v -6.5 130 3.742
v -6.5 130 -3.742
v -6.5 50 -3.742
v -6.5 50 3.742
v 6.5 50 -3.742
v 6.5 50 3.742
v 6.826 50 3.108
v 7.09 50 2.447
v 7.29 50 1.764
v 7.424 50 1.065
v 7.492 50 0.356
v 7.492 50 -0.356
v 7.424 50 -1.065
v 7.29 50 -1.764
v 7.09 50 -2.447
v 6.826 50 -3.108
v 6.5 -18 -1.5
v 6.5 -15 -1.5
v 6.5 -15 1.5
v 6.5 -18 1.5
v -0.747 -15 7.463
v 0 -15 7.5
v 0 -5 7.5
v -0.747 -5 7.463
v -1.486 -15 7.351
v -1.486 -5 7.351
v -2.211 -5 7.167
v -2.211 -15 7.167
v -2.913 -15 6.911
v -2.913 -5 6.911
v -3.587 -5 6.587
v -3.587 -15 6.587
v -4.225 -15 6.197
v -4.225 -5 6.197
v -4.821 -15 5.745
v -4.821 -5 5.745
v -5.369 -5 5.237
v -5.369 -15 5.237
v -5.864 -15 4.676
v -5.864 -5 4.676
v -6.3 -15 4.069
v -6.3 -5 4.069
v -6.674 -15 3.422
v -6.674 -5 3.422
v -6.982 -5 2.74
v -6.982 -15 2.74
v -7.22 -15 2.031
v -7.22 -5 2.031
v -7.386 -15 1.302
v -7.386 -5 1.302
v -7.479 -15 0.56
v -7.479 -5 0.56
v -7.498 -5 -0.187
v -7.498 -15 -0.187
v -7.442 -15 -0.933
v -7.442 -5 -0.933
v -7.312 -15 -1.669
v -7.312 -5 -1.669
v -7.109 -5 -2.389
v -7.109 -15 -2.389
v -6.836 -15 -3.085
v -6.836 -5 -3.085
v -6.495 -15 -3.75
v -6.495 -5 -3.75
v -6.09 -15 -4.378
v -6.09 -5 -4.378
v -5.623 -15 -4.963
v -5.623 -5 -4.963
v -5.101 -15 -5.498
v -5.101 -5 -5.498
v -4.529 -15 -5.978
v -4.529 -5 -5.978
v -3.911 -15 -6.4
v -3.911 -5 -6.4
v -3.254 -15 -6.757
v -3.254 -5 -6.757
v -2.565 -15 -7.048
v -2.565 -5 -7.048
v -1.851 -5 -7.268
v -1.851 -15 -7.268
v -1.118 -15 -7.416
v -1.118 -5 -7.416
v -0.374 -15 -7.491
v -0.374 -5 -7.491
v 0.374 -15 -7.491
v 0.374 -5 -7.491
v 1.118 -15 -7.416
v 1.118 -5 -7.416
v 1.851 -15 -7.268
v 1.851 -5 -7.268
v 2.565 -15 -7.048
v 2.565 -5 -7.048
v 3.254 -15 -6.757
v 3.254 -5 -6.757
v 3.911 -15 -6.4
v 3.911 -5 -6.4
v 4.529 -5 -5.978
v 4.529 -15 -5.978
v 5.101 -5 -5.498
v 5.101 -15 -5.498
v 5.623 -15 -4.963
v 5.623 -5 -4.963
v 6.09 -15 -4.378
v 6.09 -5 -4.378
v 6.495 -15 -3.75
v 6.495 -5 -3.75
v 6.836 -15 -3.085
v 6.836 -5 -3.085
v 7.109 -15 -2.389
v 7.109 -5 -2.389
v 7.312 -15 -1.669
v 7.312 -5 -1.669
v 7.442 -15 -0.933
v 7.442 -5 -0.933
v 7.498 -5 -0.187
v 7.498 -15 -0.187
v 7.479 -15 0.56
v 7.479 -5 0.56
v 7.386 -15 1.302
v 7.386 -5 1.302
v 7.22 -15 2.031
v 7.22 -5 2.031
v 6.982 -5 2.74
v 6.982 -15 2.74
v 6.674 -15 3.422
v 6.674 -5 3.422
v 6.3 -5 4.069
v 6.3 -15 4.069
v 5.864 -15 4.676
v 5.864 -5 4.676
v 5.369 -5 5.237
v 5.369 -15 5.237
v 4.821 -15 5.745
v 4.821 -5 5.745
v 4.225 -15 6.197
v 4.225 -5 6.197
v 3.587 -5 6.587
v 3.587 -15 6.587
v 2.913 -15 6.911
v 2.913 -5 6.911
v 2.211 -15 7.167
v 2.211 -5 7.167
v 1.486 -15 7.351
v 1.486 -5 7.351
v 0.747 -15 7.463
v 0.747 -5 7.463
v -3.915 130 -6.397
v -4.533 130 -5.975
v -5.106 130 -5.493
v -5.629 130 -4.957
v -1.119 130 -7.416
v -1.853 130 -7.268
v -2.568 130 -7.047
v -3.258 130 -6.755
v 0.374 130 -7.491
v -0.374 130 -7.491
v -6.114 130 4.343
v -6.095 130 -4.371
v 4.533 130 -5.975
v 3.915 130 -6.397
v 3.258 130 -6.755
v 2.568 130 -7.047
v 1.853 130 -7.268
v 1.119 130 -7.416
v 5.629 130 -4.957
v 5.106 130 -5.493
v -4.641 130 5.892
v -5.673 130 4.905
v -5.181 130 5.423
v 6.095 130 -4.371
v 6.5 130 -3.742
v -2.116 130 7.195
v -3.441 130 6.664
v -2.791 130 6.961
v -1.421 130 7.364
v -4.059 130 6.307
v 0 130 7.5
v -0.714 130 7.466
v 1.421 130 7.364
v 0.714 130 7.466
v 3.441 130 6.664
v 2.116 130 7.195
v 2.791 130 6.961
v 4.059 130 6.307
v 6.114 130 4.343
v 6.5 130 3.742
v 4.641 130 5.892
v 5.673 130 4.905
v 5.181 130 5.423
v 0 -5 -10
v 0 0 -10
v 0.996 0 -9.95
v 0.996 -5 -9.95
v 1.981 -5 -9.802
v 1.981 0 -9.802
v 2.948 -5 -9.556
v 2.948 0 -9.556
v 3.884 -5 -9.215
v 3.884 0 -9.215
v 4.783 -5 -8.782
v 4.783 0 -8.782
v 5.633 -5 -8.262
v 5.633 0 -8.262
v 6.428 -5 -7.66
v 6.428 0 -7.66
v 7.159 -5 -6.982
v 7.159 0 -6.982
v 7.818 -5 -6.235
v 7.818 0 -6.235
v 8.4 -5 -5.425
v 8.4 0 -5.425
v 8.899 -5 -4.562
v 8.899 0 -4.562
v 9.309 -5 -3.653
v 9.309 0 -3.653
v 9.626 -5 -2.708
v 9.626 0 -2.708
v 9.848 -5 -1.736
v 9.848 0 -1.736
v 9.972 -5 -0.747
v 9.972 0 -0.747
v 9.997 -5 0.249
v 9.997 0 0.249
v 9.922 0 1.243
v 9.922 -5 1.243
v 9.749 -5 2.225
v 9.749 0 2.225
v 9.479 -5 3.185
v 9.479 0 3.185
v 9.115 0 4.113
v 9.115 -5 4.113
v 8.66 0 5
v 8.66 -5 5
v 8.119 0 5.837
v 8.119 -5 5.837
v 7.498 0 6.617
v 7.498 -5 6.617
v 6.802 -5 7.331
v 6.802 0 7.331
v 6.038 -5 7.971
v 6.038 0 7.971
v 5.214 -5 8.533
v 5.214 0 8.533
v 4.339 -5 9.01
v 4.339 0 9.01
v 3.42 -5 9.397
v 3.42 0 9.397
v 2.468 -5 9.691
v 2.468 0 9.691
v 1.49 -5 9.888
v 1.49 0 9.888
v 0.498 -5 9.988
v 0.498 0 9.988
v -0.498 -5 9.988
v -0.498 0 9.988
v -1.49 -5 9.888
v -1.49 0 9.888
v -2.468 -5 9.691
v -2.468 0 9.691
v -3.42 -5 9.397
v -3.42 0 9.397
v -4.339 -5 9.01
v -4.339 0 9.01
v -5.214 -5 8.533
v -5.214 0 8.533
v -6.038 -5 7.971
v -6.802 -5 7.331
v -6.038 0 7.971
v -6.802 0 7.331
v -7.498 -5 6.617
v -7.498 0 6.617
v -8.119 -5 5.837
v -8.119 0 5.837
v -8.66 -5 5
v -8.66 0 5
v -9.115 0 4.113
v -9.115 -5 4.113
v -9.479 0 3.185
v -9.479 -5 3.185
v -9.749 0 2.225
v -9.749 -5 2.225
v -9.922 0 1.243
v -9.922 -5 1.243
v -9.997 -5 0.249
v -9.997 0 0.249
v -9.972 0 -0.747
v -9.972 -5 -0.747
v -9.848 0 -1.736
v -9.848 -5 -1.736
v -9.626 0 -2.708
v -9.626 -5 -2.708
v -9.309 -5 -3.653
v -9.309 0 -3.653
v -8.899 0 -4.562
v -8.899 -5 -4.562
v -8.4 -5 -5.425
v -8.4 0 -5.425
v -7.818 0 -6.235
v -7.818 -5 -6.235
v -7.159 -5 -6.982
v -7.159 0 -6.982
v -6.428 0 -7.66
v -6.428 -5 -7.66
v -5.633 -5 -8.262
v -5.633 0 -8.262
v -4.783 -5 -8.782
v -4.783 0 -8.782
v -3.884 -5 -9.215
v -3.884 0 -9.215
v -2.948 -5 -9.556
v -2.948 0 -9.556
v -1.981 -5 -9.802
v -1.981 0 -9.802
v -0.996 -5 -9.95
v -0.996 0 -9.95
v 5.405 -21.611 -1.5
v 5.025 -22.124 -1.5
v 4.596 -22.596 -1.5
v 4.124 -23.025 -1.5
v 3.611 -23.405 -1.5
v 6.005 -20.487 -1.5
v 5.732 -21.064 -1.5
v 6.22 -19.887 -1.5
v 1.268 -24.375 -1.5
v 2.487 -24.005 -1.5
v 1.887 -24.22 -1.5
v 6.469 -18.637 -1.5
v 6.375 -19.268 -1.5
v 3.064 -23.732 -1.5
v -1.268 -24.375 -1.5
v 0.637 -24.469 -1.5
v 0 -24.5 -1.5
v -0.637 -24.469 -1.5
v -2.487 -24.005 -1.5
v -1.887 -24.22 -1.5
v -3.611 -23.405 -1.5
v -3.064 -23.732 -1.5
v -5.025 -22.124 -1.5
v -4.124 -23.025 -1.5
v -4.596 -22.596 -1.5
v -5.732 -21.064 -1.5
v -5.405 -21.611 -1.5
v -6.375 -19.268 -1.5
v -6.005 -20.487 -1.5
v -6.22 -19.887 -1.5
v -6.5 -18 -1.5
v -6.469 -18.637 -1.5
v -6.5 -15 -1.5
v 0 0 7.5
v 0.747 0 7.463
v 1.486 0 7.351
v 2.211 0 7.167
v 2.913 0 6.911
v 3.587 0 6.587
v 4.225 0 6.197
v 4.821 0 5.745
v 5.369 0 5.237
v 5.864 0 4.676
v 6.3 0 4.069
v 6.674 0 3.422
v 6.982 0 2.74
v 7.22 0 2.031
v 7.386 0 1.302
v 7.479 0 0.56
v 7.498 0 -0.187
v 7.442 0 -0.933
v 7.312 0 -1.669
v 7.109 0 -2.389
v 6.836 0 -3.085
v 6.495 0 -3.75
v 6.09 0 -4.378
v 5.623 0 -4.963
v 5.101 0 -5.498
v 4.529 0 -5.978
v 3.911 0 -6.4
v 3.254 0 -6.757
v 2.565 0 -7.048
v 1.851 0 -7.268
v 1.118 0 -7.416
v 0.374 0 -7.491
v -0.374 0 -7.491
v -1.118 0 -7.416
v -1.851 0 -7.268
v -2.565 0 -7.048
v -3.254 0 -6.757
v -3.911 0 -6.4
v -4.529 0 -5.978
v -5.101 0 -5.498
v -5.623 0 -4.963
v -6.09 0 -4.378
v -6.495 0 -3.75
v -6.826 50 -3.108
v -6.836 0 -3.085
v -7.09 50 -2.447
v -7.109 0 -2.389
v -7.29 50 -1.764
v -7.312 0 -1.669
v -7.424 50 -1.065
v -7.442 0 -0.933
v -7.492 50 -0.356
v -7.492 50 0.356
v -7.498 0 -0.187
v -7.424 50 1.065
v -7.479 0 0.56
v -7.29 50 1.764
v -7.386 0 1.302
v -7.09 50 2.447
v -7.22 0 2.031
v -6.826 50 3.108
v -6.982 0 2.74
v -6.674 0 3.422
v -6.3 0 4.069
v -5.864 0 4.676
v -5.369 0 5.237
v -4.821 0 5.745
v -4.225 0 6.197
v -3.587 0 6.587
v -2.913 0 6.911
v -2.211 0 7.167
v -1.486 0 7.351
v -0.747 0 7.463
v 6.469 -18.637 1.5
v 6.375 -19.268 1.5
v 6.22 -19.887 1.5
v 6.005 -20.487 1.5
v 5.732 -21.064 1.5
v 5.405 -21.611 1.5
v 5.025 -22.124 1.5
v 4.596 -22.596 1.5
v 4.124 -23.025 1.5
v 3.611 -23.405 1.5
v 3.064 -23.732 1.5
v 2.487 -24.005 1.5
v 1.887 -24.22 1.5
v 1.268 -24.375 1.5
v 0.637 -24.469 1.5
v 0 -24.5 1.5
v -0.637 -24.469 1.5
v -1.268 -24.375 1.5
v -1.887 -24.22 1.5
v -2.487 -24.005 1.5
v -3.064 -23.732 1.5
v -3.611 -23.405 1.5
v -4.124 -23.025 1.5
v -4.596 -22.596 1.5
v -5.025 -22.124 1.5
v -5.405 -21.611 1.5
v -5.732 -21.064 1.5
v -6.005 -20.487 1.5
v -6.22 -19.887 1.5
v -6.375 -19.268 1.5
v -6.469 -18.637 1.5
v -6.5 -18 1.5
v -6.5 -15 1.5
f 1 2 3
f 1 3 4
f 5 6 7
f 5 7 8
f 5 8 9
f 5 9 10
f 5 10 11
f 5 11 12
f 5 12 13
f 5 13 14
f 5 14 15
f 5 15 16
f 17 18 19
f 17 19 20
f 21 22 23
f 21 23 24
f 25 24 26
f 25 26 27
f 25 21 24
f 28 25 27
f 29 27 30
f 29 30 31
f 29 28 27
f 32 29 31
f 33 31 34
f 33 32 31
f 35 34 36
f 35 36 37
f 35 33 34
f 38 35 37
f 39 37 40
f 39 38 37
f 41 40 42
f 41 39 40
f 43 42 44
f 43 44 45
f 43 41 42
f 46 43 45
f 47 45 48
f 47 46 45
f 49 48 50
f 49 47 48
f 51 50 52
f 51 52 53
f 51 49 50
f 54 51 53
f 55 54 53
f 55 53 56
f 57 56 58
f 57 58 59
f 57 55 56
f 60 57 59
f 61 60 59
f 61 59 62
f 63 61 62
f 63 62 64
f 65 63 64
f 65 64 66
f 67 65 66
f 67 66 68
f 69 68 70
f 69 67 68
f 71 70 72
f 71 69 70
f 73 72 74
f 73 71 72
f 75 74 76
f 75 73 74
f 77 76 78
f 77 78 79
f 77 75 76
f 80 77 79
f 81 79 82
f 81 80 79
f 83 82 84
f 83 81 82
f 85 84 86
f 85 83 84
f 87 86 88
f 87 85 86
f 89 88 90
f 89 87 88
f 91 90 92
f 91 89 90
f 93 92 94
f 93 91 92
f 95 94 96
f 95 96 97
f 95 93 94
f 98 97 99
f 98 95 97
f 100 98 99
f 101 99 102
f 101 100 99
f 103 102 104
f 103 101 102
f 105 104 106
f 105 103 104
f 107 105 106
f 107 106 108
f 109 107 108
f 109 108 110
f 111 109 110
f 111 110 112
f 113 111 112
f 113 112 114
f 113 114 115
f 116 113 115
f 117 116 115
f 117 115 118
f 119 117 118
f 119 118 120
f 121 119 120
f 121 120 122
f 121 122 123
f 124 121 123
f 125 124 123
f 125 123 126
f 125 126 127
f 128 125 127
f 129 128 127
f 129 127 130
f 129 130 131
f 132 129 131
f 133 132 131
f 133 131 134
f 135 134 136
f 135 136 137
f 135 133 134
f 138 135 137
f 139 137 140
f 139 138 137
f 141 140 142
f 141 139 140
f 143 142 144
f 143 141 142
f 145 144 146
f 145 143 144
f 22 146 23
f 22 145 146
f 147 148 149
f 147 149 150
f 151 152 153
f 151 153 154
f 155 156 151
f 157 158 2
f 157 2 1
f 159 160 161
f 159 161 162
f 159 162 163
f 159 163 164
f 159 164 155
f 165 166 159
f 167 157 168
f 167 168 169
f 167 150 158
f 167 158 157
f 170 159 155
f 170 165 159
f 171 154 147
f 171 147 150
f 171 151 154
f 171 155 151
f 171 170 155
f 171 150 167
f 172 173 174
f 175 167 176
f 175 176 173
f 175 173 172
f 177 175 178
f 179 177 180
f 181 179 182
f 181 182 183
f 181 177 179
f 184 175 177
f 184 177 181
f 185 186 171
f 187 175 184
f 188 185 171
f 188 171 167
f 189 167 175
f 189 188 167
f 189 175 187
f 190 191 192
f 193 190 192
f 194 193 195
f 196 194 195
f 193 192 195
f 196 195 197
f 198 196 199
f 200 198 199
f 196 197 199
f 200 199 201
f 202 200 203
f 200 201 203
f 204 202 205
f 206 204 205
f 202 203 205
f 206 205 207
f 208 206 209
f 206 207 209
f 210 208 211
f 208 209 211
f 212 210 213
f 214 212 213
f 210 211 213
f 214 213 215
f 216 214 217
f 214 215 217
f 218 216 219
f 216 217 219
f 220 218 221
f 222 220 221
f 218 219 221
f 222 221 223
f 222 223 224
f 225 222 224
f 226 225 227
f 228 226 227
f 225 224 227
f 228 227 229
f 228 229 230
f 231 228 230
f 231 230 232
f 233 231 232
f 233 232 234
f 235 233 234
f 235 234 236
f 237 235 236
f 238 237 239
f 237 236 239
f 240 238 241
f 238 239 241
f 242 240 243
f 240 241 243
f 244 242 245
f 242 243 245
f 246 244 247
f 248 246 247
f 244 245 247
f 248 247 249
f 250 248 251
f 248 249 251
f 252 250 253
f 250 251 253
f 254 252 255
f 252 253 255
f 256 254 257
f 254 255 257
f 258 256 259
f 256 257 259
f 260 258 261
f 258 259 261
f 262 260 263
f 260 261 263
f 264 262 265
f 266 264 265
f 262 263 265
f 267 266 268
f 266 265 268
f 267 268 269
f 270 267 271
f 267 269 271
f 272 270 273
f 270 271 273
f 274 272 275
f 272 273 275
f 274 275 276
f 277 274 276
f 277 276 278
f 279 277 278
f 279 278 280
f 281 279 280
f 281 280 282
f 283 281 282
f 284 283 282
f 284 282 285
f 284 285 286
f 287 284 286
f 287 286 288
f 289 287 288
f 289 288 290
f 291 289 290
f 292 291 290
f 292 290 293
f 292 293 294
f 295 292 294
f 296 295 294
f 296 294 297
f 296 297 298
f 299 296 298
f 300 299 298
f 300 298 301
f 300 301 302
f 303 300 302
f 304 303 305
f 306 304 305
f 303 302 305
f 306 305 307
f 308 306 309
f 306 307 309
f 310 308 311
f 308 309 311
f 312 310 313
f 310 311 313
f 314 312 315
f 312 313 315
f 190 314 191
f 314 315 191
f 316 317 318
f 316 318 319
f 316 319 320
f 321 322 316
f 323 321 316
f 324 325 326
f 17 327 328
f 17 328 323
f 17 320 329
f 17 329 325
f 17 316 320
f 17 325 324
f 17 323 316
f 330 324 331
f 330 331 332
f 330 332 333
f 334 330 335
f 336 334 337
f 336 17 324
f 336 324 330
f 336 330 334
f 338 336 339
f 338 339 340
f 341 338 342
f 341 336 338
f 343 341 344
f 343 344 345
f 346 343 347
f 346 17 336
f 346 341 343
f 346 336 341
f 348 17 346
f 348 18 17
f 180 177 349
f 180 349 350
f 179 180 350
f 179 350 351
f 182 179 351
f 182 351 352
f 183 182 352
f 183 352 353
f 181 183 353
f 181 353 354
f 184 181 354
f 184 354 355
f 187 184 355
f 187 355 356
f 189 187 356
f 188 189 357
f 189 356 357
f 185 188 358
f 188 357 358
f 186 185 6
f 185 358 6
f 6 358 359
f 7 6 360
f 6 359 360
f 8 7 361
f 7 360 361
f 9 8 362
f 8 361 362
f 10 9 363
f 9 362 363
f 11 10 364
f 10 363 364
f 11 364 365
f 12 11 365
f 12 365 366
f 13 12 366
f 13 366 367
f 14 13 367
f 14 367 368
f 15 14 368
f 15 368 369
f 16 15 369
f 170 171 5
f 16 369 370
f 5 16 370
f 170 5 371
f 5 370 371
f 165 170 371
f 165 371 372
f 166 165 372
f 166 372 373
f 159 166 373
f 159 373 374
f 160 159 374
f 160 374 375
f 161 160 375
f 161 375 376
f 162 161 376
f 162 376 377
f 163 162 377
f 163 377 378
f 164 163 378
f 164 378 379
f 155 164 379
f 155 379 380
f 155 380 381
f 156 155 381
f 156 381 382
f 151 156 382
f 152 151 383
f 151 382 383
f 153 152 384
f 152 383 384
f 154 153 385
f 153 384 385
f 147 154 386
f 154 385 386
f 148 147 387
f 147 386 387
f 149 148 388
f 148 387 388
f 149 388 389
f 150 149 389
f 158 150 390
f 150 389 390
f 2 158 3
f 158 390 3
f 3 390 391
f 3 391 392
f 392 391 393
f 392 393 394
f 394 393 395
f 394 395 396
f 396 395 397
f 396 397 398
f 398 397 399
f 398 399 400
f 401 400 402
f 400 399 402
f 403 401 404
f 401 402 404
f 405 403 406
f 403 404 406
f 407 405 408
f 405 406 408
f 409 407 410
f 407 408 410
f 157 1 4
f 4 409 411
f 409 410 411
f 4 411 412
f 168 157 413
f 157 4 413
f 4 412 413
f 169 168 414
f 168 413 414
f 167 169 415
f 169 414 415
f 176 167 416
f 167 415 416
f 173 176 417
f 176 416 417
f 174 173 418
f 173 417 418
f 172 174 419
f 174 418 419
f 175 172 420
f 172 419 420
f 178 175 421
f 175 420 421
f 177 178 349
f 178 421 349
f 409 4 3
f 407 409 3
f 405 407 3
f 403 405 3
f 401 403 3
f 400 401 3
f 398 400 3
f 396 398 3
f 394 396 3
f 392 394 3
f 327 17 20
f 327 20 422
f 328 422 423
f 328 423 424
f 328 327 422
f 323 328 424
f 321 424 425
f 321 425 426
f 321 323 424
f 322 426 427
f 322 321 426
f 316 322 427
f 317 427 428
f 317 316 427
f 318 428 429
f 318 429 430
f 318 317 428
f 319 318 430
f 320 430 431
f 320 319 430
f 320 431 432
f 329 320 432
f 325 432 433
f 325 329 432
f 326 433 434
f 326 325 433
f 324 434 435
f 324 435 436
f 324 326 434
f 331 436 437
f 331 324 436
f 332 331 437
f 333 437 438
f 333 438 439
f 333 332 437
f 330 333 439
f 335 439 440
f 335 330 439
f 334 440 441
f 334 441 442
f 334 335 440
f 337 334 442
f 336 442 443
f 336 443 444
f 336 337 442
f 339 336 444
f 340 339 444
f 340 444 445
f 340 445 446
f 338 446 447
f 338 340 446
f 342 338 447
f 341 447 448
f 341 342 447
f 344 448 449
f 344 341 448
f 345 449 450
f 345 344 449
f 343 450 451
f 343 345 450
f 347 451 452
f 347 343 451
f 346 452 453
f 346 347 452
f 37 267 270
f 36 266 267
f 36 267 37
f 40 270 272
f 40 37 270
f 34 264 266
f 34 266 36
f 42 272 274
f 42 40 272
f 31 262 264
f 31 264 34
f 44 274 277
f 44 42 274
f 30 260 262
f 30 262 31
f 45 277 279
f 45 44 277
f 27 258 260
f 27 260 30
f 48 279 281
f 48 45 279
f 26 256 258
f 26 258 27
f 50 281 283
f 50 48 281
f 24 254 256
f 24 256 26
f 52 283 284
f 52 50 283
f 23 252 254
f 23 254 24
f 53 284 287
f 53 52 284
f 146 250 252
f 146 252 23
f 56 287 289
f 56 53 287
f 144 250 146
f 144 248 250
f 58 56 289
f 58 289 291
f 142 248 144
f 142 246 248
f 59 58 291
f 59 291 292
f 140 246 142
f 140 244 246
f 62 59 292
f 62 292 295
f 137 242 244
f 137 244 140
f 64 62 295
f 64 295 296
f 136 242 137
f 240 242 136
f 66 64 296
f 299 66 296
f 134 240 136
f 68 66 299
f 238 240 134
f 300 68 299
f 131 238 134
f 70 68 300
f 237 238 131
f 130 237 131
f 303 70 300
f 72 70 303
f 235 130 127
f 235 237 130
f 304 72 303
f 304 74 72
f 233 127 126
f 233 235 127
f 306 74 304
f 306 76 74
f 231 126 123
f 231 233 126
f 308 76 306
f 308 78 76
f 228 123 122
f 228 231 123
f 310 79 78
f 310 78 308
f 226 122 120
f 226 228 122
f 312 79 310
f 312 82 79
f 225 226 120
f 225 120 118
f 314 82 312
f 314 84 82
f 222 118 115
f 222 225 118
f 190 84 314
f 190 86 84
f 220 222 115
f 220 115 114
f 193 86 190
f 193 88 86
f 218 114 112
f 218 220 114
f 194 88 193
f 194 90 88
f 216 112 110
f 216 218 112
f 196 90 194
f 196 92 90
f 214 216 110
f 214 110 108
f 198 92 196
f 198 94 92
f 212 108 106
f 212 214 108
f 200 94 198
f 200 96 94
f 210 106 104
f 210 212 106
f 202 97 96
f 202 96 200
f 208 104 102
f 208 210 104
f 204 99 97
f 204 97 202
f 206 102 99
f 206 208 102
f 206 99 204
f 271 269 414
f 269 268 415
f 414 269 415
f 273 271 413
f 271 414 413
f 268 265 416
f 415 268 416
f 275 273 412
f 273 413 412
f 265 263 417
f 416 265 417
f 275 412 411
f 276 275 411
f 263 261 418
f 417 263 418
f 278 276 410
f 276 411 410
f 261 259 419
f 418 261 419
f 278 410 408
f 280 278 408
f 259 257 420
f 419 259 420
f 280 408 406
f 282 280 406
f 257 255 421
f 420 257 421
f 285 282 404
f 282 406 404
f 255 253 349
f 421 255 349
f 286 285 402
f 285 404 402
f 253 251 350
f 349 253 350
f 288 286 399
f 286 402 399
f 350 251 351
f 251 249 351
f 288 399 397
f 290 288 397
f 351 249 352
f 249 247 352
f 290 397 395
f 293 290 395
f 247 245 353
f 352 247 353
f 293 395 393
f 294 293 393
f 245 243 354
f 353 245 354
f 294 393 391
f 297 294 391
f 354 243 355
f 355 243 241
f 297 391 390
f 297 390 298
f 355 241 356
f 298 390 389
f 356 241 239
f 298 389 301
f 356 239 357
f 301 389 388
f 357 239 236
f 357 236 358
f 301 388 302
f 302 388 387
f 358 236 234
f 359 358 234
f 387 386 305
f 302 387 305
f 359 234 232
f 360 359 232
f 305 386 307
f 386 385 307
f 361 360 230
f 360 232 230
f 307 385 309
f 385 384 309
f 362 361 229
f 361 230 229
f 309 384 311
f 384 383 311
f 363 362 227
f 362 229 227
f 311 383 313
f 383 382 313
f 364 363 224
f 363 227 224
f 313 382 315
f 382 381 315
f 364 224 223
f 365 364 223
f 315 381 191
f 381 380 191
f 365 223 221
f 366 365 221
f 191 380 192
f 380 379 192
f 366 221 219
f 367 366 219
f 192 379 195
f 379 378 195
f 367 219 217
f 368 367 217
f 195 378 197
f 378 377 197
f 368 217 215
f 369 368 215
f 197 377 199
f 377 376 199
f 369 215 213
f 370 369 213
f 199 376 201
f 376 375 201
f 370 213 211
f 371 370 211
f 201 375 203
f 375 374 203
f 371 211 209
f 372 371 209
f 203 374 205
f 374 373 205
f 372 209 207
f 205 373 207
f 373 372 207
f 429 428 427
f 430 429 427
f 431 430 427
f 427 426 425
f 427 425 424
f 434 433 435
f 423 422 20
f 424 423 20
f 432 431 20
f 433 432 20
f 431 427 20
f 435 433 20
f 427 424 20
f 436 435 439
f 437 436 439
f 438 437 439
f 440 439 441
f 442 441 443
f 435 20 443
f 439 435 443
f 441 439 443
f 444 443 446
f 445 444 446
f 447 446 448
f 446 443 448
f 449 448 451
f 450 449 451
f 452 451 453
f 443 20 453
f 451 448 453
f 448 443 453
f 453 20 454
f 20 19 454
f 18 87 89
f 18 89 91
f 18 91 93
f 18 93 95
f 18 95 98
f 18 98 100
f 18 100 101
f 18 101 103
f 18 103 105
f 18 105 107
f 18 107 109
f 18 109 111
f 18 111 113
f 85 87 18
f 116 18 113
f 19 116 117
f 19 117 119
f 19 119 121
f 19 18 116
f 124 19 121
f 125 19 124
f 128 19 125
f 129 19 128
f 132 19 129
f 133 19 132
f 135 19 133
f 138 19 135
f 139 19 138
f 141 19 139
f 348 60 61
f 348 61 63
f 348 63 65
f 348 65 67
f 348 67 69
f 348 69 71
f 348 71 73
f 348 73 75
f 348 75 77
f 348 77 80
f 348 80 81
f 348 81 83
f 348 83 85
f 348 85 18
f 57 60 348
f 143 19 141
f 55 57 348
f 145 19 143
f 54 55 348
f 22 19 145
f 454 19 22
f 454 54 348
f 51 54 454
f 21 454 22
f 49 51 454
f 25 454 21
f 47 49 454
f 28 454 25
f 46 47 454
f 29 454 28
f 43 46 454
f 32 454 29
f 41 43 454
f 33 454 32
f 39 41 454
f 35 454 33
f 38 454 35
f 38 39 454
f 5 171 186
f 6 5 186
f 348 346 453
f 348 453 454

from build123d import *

# Parameters (mm, degrees)
SKETCH3_R                = 7.5
BOSS_EXTRUDE1_DEPTH      = 130
SKETCH4_R                = 10
BOSS_EXTRUDE2_DEPTH      = 5
BOSS_EXTRUDE3_START      = 10
SKETCH5_R                = 7.5
BOSS_EXTRUDE3_DEPTH      = 10
BOSS_EXTRUDE4_DEPTH      = 1.5
BOSS_EXTRUDE4_DEPTH_BACK = 1.5
CUT_EXTRUDE1_START       = -80
CUT_EXTRUDE1_DEPTH       = 80


with BuildPart() as part:
    # Sketch3 → Boss-Extrude1 (new body)
    with BuildSketch(Plane(origin=(0, 0, 0), x_dir=(1, 0, 0), z_dir=(0, 1, 0))):
        Circle(SKETCH3_R)
    extrude(amount=BOSS_EXTRUDE1_DEPTH)

    # Sketch4 → Boss-Extrude2 (add)
    with BuildSketch(Plane.XZ):
        Circle(SKETCH4_R)
    extrude(amount=BOSS_EXTRUDE2_DEPTH)

    # Sketch5 → Boss-Extrude3 (add)
    with BuildSketch(Plane.XZ.offset(5).offset(BOSS_EXTRUDE3_START)):
        Circle(SKETCH5_R)
    extrude(amount=-BOSS_EXTRUDE3_DEPTH)

    # Sketch7 → Boss-Extrude4 (add, two sides: drawn at the far end of the back side and taken through both)
    with BuildSketch(Plane.XY.offset(-BOSS_EXTRUDE4_DEPTH_BACK)):
        with BuildLine():
            Line((-6.5, -15), (6.5, -15))
            Line((6.5, -15), (6.5, -18))
            ThreePointArc((6.5, -18), (0, -24.5), (-6.5, -18))
            Line((-6.5, -18), (-6.5, -15))
        make_face()
    extrude(amount=BOSS_EXTRUDE4_DEPTH + BOSS_EXTRUDE4_DEPTH_BACK)

    # Sketch8 → Cut-Extrude1 (cut)
    with BuildSketch(Plane(origin=(0, 130, 0), x_dir=(1, 0, 0), z_dir=(0, 1, 0)).offset(CUT_EXTRUDE1_START)):
        with BuildLine():
            Line((6.5, 3.741657387), (6.5, -3.741657387))
            ThreePointArc((6.5, -3.741657387), (7.5, 0), (6.5, 3.741657387))
        make_face()
        with BuildLine():
            Line((-6.5, 3.741657387), (-6.5, -3.741657387))
            ThreePointArc((-6.5, -3.741657387), (-7.5, 0), (-6.5, 3.741657387))
        make_face()
    extrude(amount=CUT_EXTRUDE1_DEPTH, mode=Mode.SUBTRACT)


solid = part.part
